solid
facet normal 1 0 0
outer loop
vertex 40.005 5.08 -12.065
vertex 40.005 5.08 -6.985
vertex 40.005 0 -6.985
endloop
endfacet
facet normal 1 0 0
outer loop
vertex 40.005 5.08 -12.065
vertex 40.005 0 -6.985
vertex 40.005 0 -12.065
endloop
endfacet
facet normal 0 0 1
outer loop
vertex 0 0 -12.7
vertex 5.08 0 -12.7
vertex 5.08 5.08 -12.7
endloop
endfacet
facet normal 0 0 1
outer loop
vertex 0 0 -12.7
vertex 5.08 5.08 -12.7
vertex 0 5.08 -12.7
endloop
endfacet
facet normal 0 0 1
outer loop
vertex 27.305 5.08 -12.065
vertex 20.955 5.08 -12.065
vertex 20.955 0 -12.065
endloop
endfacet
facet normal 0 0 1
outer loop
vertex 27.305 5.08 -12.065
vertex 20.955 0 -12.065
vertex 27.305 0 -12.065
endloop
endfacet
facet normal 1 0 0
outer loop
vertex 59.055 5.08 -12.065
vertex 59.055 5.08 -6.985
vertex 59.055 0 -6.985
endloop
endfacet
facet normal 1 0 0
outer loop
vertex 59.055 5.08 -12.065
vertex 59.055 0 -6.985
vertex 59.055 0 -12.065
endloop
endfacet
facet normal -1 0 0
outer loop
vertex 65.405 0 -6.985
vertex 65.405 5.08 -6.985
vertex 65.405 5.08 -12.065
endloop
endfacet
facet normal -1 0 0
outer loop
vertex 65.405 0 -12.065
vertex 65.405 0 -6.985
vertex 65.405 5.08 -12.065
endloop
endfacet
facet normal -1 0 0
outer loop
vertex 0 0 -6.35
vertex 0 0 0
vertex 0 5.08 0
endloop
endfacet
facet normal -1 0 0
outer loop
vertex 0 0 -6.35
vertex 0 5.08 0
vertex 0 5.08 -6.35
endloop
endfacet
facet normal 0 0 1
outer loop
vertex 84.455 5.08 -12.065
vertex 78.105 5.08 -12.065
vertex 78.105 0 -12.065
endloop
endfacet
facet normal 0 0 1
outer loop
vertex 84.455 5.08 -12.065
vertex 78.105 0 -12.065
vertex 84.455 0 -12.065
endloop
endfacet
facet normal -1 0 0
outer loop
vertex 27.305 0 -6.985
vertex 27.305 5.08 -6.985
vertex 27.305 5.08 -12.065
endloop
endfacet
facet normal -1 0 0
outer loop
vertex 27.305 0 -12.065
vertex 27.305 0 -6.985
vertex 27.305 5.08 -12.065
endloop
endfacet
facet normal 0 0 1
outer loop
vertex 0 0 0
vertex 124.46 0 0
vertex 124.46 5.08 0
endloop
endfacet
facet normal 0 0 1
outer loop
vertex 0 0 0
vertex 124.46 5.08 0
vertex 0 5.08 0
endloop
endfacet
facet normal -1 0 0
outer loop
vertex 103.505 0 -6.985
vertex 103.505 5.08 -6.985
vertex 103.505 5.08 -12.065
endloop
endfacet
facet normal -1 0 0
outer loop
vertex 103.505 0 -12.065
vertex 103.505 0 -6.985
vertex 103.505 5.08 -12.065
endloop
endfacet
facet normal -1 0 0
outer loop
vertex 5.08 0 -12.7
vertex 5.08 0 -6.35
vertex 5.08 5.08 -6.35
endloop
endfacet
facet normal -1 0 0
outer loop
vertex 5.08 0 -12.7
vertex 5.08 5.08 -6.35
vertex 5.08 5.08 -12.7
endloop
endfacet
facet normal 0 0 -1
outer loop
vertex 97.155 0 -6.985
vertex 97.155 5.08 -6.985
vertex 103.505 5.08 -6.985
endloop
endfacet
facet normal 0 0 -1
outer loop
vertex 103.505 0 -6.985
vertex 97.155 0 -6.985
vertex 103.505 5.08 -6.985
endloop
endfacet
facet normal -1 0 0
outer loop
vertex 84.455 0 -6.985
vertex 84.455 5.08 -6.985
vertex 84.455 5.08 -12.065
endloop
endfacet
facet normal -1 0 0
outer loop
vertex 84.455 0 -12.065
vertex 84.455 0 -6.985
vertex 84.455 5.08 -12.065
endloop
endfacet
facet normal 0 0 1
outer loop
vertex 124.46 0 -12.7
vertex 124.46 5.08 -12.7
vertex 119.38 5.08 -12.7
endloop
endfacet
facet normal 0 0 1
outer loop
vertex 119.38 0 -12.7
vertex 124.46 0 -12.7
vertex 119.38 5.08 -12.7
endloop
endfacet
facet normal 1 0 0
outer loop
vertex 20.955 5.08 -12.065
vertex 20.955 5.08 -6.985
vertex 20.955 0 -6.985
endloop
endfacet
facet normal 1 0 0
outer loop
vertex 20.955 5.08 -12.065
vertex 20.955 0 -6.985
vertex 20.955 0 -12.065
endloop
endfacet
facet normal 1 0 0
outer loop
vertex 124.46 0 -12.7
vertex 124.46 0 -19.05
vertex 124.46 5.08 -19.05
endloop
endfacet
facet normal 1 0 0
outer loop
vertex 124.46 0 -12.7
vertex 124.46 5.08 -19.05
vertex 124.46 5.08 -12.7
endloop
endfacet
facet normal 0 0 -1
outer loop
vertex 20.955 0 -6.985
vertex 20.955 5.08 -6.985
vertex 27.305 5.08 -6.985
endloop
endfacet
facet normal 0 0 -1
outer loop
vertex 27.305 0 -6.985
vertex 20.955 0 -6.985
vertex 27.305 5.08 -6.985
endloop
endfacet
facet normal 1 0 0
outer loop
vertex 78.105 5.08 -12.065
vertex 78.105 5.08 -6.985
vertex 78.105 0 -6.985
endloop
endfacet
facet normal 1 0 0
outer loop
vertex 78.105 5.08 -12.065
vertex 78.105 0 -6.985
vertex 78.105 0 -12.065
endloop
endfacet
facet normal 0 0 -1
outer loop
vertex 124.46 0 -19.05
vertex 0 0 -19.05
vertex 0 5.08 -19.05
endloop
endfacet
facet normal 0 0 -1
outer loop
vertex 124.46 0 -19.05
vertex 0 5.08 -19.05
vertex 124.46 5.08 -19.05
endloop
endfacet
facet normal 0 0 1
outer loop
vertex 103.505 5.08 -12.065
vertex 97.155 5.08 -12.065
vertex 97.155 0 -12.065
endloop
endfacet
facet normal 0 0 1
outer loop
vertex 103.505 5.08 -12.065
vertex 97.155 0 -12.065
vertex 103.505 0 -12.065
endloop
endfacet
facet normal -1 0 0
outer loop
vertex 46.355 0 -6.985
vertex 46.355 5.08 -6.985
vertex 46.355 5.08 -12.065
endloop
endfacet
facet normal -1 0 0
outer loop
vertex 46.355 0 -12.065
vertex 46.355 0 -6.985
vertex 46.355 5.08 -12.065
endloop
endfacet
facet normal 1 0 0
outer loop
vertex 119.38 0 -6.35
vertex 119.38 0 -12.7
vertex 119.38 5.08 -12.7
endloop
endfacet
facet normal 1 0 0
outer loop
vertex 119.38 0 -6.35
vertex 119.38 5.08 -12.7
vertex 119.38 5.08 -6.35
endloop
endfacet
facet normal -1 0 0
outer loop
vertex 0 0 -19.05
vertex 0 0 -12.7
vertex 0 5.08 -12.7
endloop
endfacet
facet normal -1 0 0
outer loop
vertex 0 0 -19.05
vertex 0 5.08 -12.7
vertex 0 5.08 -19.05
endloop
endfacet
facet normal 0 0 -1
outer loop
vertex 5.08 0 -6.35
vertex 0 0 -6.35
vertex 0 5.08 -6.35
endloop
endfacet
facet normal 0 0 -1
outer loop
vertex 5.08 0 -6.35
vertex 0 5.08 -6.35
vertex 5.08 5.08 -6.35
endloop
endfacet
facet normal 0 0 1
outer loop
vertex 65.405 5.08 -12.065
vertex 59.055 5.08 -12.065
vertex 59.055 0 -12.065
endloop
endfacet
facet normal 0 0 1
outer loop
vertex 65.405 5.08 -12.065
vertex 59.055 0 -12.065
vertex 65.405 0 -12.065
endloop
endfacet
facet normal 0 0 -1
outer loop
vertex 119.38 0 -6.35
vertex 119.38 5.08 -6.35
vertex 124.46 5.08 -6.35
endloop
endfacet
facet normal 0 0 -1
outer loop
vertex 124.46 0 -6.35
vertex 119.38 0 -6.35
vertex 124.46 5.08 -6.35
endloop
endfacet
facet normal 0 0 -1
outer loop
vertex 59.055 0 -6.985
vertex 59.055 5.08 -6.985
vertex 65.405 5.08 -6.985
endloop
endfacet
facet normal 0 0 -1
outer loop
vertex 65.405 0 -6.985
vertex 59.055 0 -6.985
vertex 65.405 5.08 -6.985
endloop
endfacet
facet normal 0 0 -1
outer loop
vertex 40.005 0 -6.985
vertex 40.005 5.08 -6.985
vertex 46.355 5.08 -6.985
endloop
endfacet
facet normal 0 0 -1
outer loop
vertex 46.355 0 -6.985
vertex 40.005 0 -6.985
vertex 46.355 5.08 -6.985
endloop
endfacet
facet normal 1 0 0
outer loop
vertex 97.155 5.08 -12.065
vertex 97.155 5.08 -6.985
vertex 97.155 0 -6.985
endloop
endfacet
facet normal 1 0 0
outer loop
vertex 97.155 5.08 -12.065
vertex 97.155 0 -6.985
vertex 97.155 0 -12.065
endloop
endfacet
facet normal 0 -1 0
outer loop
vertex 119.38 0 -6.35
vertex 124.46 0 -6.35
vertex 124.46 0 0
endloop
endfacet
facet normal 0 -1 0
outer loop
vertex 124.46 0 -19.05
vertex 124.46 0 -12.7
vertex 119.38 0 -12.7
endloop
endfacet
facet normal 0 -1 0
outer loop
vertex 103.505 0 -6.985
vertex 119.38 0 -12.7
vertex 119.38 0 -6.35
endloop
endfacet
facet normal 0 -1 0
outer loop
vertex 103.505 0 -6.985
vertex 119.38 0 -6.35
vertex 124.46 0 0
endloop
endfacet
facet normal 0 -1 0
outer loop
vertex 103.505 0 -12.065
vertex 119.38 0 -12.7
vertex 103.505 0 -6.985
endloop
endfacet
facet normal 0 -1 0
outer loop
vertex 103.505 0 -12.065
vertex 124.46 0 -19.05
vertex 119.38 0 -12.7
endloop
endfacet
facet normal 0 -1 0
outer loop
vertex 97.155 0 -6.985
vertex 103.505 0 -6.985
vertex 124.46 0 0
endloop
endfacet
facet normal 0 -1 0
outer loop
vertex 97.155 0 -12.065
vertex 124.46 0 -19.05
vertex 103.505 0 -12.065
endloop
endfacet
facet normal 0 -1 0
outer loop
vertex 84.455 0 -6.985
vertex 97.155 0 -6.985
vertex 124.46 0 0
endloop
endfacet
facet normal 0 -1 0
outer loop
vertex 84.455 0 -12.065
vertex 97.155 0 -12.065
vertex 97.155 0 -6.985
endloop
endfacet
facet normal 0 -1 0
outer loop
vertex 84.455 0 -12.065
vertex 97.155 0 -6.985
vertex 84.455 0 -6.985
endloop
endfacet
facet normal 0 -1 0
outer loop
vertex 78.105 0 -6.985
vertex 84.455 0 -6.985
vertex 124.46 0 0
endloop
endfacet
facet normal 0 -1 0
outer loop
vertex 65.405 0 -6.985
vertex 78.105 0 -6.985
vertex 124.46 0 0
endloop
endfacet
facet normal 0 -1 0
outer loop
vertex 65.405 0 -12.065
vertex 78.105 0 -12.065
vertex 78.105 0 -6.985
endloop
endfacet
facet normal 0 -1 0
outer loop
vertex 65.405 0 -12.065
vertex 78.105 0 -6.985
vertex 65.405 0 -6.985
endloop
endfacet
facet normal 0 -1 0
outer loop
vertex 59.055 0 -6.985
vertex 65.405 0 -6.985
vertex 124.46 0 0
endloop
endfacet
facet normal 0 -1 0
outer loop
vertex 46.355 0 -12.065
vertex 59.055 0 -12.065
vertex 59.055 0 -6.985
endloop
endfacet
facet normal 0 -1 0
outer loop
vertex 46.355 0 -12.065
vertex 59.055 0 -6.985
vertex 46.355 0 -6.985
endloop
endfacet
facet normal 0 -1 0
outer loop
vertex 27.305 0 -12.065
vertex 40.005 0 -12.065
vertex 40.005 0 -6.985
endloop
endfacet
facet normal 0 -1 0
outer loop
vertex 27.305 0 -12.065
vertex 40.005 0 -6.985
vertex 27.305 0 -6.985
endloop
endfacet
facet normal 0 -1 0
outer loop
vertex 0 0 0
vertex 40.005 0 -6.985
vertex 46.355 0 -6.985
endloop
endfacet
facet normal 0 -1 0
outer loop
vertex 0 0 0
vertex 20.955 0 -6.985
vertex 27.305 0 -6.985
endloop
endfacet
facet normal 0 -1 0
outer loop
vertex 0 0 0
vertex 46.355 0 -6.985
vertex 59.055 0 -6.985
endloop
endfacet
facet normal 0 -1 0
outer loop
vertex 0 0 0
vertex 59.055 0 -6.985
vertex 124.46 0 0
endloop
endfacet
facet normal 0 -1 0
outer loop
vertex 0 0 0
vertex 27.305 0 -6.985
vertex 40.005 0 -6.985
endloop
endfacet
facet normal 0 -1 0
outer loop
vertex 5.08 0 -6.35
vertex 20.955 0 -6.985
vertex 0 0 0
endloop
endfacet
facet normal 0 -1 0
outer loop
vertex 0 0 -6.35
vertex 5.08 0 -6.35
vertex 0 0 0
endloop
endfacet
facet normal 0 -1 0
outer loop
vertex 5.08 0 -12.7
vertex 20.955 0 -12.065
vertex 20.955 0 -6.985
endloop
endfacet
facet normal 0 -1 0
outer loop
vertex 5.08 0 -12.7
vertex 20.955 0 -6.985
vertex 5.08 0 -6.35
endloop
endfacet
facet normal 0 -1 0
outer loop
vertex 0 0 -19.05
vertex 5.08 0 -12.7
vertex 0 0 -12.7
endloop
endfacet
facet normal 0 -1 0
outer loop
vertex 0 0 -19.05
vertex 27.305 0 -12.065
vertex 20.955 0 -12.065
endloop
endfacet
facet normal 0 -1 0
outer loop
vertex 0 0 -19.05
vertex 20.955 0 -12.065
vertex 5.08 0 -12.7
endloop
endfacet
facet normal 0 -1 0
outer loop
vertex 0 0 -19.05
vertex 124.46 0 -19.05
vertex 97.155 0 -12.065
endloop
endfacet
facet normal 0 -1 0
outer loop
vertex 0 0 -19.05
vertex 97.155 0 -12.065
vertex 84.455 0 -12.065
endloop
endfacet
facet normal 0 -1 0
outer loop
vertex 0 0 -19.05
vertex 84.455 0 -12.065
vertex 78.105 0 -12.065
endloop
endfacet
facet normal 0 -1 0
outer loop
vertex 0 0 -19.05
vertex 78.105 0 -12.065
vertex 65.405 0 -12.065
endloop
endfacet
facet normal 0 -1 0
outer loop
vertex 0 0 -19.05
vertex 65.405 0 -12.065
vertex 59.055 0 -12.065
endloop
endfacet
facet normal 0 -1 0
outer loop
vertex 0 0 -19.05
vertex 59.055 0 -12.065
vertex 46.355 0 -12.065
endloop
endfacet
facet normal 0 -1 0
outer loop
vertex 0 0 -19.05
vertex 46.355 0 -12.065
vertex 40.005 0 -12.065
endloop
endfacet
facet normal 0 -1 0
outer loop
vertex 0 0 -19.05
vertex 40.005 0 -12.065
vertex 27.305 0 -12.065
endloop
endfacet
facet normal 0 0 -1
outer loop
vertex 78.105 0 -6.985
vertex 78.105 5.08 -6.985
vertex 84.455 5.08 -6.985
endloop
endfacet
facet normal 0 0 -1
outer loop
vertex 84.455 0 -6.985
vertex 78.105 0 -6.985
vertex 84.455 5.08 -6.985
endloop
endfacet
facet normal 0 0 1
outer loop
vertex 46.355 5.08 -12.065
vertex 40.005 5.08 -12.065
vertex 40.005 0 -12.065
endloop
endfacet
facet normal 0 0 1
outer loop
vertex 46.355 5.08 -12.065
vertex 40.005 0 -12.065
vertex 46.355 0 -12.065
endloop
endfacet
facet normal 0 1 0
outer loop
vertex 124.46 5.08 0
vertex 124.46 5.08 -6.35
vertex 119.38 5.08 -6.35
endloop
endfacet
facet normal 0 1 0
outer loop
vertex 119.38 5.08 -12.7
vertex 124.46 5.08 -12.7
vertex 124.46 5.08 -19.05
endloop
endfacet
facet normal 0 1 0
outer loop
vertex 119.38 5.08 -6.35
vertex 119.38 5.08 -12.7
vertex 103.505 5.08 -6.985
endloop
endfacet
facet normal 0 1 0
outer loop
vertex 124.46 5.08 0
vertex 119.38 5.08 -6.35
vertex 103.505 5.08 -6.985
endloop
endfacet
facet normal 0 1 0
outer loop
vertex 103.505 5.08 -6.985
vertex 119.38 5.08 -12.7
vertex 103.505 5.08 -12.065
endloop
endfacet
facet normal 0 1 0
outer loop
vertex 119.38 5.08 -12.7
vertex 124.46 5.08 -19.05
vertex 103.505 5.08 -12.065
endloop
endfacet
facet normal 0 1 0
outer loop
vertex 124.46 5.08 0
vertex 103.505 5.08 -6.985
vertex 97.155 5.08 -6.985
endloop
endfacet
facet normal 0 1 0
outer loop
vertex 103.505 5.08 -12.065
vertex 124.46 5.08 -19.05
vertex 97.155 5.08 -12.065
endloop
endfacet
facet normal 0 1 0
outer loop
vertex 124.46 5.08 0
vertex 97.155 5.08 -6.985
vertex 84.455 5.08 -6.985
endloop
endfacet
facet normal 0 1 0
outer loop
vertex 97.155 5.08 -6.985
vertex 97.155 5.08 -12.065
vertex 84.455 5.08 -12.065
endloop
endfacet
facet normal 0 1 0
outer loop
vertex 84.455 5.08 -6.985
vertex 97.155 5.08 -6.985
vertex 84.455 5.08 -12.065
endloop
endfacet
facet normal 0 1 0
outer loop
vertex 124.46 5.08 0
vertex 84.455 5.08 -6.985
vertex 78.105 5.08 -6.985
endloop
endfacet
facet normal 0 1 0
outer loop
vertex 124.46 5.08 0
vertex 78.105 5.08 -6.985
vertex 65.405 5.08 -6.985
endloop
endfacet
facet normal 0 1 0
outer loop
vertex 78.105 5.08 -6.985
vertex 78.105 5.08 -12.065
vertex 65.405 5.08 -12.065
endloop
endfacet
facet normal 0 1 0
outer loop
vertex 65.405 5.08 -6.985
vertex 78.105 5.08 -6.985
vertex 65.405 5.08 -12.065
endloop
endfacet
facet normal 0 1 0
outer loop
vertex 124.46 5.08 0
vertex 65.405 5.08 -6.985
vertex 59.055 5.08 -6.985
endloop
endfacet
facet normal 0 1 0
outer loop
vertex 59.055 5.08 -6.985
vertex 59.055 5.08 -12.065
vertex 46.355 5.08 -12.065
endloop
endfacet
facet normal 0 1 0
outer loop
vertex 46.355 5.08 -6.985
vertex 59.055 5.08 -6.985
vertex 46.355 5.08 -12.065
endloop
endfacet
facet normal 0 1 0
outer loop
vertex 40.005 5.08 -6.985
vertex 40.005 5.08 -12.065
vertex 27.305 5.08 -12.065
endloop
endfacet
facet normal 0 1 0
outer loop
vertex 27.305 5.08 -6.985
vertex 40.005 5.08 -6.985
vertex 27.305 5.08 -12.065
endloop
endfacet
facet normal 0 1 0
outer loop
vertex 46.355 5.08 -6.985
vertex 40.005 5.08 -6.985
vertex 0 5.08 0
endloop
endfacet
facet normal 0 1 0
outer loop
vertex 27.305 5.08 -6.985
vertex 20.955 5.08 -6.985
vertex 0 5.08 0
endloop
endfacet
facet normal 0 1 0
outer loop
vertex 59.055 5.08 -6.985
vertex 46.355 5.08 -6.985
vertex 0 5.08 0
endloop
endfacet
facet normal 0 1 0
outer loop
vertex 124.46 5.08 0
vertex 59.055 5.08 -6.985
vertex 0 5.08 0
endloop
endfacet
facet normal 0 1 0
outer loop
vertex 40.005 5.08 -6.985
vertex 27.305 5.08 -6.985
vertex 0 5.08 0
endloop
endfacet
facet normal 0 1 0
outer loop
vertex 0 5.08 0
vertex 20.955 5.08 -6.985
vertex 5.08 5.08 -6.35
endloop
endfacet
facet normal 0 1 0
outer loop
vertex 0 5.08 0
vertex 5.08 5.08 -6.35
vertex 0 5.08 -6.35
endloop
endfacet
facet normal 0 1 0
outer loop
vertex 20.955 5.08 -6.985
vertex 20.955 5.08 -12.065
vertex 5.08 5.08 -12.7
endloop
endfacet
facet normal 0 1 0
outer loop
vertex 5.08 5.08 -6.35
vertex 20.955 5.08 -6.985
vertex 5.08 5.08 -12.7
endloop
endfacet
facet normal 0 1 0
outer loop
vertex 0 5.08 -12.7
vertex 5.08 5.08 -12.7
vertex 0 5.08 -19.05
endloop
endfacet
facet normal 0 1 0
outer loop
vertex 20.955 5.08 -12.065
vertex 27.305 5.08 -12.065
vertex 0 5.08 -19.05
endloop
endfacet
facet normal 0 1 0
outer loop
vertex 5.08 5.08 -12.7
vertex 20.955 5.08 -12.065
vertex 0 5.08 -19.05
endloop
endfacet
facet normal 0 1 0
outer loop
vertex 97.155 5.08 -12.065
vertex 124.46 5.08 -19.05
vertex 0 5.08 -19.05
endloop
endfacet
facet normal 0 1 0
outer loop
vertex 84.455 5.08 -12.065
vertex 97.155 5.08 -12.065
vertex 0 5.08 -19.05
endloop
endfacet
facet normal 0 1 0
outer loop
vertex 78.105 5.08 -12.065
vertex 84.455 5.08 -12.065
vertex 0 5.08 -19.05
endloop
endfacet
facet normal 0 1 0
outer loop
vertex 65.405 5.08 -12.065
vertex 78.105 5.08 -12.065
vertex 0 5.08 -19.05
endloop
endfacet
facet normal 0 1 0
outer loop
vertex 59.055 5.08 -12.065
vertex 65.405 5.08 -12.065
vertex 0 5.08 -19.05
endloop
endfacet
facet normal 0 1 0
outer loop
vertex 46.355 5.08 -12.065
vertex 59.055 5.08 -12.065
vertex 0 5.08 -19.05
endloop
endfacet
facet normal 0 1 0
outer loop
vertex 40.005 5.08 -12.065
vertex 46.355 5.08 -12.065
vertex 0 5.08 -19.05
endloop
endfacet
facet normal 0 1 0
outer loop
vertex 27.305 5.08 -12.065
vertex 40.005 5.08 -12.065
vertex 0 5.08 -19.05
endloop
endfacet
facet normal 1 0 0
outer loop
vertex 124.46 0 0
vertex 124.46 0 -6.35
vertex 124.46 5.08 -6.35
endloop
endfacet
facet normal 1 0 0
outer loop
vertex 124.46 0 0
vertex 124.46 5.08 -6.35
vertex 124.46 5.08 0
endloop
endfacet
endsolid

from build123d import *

# Parameters (mm, degrees)
BOSS_EXTRUDE1_DEPTH = 5.08
SKETCH2_W           = 6.35
SKETCH2_H           = 5.08
CUT_EXTRUDE1_DEPTH  = 6.08
LPATTERN1_COUNT     = 5
LPATTERN1_PITCH     = 19.05


with BuildPart() as part:
    # Sketch1 → Boss-Extrude1 (new body)
    with BuildSketch(Plane(origin=(0, 0, 0), x_dir=(1, 0, 0), z_dir=(0, 1, 0))):
        Polygon((0, 12.7), (0, 19.05), (124.46, 19.05), (124.46, 12.7), (119.38, 12.7), (119.38, 6.35), (124.46, 6.35), (124.46, 0), (0, 0), (0, 6.35), (5.08, 6.35), (5.08, 12.7), align=None)
    extrude(amount=BOSS_EXTRUDE1_DEPTH)

    # Sketch2 → Cut-Extrude1 (cut, through all)
    with BuildSketch(Plane(origin=(0, 5.08, 0), x_dir=(1, 0, 0), z_dir=(0, 1, 0))):
        with Locations((24.13, 9.525)):
            Rectangle(SKETCH2_W, SKETCH2_H)
    cut_extrude1 = extrude(amount=-CUT_EXTRUDE1_DEPTH, mode=Mode.SUBTRACT)

    # LPattern1: Cut-Extrude1 ×5
    with Locations(*[(i * LPATTERN1_PITCH, 0, 0) for i in range(1, LPATTERN1_COUNT)]):
        add(cut_extrude1, mode=Mode.SUBTRACT)


solid = part.part
